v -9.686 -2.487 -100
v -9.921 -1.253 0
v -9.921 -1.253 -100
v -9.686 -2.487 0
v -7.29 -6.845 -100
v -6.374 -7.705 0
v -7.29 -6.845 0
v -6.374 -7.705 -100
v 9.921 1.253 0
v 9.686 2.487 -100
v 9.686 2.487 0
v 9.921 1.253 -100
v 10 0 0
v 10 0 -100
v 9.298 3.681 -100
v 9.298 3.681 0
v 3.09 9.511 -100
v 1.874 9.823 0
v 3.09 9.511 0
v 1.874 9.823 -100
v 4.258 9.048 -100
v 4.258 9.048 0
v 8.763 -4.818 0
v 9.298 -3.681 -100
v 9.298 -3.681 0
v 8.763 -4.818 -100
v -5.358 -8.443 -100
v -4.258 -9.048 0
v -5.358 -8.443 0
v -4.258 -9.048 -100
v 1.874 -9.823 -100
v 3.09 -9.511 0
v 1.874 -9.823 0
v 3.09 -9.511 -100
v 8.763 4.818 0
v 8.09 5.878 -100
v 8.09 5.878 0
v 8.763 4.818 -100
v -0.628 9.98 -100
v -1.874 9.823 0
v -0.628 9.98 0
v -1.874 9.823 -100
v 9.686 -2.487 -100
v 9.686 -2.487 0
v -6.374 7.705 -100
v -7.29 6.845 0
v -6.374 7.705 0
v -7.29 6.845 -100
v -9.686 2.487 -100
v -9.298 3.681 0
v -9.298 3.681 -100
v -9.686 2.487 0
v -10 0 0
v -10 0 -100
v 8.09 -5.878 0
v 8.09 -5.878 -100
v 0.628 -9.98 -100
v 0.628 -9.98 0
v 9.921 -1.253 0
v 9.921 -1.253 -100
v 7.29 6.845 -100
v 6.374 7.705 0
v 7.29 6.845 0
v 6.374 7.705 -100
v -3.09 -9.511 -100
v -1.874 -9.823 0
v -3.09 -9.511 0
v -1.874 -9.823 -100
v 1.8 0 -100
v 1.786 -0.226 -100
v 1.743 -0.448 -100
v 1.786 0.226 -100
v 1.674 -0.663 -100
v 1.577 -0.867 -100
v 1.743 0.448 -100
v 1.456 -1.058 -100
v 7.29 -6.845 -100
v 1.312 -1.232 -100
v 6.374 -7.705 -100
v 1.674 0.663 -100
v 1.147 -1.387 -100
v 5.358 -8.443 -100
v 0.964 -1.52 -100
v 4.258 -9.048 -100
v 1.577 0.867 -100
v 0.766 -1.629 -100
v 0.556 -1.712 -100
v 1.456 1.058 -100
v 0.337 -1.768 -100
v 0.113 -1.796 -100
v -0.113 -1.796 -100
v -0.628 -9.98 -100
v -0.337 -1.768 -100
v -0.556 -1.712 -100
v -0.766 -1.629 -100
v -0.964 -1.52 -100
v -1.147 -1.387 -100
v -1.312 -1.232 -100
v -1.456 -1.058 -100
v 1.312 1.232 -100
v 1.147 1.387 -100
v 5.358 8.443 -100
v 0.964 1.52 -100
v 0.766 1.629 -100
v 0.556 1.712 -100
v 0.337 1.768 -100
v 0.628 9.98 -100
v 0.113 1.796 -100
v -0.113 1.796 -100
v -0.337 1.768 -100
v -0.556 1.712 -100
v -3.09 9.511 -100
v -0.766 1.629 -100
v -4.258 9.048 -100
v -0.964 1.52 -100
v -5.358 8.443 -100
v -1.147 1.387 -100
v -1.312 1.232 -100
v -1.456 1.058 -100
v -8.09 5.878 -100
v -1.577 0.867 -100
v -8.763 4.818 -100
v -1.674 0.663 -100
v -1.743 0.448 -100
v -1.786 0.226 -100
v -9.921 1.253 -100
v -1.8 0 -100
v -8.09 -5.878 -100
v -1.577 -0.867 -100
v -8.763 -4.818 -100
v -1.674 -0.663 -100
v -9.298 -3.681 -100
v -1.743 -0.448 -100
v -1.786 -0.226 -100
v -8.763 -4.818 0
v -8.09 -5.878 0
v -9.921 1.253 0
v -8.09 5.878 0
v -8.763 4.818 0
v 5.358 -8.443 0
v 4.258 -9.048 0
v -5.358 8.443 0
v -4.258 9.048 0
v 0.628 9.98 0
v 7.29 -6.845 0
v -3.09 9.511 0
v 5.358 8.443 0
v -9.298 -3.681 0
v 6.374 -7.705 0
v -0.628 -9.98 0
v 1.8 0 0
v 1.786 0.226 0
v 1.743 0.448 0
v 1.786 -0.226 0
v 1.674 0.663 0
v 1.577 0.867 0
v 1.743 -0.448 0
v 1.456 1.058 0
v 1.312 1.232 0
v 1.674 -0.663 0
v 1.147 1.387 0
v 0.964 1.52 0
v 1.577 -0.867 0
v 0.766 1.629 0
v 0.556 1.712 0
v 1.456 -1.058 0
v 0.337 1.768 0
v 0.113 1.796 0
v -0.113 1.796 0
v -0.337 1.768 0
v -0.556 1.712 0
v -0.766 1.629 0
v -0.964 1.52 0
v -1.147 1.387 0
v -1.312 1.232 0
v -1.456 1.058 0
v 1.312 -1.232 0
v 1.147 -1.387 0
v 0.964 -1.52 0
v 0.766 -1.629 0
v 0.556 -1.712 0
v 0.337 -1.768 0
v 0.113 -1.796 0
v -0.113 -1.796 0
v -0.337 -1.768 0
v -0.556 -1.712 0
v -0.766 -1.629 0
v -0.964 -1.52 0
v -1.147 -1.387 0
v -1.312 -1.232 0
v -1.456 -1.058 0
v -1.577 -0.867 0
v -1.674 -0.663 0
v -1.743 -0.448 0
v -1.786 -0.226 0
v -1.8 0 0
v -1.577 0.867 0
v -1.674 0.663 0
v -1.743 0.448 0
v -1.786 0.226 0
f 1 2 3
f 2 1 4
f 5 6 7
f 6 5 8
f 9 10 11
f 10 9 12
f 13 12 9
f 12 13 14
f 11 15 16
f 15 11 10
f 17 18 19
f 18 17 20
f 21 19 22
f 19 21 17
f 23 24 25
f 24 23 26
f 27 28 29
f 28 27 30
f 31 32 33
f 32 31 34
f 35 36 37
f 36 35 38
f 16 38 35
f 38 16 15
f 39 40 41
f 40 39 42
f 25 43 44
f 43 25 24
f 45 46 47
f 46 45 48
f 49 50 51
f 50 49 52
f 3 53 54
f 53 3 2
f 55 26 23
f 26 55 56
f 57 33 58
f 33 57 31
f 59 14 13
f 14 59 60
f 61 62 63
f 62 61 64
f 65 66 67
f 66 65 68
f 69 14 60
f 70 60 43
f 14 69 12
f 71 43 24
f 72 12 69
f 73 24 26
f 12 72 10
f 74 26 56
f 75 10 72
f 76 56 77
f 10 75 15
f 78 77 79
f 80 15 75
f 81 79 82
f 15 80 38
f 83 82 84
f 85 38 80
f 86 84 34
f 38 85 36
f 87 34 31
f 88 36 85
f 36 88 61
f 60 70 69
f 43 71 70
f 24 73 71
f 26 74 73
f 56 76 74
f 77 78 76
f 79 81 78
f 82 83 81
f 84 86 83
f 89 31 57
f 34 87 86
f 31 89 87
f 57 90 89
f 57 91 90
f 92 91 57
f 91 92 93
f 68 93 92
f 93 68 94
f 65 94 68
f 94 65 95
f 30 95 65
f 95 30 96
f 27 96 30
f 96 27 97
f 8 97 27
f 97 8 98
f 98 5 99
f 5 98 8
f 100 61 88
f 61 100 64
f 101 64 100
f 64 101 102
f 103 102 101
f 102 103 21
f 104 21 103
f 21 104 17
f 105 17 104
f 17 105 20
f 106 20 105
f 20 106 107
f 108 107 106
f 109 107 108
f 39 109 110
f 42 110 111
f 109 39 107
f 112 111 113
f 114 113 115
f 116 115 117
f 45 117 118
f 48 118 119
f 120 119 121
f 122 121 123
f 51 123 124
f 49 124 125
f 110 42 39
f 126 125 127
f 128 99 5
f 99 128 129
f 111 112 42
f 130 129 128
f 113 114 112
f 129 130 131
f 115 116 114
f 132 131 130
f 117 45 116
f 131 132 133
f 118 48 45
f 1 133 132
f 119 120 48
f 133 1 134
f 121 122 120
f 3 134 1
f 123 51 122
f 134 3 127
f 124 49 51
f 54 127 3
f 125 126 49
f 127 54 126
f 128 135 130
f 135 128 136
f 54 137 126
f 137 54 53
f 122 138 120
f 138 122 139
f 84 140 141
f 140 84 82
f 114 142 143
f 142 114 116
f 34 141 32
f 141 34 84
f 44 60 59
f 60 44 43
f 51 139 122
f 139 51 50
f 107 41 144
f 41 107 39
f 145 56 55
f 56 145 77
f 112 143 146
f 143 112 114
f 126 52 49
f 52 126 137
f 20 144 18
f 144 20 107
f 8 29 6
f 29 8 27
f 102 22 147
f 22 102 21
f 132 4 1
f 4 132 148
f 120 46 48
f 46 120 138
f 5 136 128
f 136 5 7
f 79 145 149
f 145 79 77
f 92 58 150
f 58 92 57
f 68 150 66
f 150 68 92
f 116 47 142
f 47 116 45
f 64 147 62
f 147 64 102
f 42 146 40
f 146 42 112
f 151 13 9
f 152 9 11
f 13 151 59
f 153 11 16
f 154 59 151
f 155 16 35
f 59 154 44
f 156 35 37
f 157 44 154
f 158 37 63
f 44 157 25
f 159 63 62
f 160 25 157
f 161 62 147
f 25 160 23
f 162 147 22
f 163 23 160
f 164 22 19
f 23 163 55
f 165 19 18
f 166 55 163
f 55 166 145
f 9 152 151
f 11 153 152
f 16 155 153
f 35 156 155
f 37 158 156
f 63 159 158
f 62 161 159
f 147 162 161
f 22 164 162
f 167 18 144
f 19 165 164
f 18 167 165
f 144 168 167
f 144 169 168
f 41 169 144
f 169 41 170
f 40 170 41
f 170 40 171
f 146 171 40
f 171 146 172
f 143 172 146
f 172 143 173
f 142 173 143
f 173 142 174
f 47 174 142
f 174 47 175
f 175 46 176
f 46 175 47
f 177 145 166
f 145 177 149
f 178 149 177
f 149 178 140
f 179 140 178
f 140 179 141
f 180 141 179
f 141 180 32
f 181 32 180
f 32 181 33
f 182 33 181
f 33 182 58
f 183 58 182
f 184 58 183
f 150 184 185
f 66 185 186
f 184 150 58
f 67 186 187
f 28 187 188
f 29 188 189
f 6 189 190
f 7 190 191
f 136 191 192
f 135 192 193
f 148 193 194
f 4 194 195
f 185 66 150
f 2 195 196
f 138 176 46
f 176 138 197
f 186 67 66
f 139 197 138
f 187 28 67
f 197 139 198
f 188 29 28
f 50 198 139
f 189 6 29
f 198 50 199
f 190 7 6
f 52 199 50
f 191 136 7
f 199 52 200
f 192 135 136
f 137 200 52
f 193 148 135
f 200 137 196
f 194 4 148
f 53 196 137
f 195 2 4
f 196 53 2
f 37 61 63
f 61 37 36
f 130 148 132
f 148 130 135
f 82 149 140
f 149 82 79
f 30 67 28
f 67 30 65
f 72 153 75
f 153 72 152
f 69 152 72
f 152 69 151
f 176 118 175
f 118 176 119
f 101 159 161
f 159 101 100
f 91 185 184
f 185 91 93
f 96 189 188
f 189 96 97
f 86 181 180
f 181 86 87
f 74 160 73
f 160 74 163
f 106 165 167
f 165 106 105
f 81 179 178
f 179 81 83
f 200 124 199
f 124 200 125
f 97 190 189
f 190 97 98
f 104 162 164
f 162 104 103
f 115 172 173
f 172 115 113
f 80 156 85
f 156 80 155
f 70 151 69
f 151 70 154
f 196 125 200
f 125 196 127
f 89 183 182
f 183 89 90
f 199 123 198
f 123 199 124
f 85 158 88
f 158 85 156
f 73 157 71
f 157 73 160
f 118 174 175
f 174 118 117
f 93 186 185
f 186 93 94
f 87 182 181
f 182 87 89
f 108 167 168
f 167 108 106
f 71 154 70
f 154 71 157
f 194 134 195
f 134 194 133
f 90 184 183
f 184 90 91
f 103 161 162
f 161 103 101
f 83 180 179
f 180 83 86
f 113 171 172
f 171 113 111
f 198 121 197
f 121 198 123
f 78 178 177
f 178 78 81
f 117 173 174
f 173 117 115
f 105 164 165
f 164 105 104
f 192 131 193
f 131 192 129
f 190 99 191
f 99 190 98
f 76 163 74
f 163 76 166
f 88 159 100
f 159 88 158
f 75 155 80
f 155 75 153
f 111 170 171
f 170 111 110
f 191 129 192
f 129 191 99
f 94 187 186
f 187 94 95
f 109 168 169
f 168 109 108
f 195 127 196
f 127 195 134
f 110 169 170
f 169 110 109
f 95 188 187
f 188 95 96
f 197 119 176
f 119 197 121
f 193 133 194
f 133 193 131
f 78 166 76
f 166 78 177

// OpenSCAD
$fn = 50;


difference() {
	union() {
		translate(v = [0, 0, -100.0000000000]) {
			cylinder(h = 100, r = 10.0000000000);
		}
		cylinder(h = 0, r = 16.0000000000);
	}
	union() {
		#translate(v = [0, 0, -100]) {
			cylinder(h = 100, r = 1.8000000000);
		}
	}
}
